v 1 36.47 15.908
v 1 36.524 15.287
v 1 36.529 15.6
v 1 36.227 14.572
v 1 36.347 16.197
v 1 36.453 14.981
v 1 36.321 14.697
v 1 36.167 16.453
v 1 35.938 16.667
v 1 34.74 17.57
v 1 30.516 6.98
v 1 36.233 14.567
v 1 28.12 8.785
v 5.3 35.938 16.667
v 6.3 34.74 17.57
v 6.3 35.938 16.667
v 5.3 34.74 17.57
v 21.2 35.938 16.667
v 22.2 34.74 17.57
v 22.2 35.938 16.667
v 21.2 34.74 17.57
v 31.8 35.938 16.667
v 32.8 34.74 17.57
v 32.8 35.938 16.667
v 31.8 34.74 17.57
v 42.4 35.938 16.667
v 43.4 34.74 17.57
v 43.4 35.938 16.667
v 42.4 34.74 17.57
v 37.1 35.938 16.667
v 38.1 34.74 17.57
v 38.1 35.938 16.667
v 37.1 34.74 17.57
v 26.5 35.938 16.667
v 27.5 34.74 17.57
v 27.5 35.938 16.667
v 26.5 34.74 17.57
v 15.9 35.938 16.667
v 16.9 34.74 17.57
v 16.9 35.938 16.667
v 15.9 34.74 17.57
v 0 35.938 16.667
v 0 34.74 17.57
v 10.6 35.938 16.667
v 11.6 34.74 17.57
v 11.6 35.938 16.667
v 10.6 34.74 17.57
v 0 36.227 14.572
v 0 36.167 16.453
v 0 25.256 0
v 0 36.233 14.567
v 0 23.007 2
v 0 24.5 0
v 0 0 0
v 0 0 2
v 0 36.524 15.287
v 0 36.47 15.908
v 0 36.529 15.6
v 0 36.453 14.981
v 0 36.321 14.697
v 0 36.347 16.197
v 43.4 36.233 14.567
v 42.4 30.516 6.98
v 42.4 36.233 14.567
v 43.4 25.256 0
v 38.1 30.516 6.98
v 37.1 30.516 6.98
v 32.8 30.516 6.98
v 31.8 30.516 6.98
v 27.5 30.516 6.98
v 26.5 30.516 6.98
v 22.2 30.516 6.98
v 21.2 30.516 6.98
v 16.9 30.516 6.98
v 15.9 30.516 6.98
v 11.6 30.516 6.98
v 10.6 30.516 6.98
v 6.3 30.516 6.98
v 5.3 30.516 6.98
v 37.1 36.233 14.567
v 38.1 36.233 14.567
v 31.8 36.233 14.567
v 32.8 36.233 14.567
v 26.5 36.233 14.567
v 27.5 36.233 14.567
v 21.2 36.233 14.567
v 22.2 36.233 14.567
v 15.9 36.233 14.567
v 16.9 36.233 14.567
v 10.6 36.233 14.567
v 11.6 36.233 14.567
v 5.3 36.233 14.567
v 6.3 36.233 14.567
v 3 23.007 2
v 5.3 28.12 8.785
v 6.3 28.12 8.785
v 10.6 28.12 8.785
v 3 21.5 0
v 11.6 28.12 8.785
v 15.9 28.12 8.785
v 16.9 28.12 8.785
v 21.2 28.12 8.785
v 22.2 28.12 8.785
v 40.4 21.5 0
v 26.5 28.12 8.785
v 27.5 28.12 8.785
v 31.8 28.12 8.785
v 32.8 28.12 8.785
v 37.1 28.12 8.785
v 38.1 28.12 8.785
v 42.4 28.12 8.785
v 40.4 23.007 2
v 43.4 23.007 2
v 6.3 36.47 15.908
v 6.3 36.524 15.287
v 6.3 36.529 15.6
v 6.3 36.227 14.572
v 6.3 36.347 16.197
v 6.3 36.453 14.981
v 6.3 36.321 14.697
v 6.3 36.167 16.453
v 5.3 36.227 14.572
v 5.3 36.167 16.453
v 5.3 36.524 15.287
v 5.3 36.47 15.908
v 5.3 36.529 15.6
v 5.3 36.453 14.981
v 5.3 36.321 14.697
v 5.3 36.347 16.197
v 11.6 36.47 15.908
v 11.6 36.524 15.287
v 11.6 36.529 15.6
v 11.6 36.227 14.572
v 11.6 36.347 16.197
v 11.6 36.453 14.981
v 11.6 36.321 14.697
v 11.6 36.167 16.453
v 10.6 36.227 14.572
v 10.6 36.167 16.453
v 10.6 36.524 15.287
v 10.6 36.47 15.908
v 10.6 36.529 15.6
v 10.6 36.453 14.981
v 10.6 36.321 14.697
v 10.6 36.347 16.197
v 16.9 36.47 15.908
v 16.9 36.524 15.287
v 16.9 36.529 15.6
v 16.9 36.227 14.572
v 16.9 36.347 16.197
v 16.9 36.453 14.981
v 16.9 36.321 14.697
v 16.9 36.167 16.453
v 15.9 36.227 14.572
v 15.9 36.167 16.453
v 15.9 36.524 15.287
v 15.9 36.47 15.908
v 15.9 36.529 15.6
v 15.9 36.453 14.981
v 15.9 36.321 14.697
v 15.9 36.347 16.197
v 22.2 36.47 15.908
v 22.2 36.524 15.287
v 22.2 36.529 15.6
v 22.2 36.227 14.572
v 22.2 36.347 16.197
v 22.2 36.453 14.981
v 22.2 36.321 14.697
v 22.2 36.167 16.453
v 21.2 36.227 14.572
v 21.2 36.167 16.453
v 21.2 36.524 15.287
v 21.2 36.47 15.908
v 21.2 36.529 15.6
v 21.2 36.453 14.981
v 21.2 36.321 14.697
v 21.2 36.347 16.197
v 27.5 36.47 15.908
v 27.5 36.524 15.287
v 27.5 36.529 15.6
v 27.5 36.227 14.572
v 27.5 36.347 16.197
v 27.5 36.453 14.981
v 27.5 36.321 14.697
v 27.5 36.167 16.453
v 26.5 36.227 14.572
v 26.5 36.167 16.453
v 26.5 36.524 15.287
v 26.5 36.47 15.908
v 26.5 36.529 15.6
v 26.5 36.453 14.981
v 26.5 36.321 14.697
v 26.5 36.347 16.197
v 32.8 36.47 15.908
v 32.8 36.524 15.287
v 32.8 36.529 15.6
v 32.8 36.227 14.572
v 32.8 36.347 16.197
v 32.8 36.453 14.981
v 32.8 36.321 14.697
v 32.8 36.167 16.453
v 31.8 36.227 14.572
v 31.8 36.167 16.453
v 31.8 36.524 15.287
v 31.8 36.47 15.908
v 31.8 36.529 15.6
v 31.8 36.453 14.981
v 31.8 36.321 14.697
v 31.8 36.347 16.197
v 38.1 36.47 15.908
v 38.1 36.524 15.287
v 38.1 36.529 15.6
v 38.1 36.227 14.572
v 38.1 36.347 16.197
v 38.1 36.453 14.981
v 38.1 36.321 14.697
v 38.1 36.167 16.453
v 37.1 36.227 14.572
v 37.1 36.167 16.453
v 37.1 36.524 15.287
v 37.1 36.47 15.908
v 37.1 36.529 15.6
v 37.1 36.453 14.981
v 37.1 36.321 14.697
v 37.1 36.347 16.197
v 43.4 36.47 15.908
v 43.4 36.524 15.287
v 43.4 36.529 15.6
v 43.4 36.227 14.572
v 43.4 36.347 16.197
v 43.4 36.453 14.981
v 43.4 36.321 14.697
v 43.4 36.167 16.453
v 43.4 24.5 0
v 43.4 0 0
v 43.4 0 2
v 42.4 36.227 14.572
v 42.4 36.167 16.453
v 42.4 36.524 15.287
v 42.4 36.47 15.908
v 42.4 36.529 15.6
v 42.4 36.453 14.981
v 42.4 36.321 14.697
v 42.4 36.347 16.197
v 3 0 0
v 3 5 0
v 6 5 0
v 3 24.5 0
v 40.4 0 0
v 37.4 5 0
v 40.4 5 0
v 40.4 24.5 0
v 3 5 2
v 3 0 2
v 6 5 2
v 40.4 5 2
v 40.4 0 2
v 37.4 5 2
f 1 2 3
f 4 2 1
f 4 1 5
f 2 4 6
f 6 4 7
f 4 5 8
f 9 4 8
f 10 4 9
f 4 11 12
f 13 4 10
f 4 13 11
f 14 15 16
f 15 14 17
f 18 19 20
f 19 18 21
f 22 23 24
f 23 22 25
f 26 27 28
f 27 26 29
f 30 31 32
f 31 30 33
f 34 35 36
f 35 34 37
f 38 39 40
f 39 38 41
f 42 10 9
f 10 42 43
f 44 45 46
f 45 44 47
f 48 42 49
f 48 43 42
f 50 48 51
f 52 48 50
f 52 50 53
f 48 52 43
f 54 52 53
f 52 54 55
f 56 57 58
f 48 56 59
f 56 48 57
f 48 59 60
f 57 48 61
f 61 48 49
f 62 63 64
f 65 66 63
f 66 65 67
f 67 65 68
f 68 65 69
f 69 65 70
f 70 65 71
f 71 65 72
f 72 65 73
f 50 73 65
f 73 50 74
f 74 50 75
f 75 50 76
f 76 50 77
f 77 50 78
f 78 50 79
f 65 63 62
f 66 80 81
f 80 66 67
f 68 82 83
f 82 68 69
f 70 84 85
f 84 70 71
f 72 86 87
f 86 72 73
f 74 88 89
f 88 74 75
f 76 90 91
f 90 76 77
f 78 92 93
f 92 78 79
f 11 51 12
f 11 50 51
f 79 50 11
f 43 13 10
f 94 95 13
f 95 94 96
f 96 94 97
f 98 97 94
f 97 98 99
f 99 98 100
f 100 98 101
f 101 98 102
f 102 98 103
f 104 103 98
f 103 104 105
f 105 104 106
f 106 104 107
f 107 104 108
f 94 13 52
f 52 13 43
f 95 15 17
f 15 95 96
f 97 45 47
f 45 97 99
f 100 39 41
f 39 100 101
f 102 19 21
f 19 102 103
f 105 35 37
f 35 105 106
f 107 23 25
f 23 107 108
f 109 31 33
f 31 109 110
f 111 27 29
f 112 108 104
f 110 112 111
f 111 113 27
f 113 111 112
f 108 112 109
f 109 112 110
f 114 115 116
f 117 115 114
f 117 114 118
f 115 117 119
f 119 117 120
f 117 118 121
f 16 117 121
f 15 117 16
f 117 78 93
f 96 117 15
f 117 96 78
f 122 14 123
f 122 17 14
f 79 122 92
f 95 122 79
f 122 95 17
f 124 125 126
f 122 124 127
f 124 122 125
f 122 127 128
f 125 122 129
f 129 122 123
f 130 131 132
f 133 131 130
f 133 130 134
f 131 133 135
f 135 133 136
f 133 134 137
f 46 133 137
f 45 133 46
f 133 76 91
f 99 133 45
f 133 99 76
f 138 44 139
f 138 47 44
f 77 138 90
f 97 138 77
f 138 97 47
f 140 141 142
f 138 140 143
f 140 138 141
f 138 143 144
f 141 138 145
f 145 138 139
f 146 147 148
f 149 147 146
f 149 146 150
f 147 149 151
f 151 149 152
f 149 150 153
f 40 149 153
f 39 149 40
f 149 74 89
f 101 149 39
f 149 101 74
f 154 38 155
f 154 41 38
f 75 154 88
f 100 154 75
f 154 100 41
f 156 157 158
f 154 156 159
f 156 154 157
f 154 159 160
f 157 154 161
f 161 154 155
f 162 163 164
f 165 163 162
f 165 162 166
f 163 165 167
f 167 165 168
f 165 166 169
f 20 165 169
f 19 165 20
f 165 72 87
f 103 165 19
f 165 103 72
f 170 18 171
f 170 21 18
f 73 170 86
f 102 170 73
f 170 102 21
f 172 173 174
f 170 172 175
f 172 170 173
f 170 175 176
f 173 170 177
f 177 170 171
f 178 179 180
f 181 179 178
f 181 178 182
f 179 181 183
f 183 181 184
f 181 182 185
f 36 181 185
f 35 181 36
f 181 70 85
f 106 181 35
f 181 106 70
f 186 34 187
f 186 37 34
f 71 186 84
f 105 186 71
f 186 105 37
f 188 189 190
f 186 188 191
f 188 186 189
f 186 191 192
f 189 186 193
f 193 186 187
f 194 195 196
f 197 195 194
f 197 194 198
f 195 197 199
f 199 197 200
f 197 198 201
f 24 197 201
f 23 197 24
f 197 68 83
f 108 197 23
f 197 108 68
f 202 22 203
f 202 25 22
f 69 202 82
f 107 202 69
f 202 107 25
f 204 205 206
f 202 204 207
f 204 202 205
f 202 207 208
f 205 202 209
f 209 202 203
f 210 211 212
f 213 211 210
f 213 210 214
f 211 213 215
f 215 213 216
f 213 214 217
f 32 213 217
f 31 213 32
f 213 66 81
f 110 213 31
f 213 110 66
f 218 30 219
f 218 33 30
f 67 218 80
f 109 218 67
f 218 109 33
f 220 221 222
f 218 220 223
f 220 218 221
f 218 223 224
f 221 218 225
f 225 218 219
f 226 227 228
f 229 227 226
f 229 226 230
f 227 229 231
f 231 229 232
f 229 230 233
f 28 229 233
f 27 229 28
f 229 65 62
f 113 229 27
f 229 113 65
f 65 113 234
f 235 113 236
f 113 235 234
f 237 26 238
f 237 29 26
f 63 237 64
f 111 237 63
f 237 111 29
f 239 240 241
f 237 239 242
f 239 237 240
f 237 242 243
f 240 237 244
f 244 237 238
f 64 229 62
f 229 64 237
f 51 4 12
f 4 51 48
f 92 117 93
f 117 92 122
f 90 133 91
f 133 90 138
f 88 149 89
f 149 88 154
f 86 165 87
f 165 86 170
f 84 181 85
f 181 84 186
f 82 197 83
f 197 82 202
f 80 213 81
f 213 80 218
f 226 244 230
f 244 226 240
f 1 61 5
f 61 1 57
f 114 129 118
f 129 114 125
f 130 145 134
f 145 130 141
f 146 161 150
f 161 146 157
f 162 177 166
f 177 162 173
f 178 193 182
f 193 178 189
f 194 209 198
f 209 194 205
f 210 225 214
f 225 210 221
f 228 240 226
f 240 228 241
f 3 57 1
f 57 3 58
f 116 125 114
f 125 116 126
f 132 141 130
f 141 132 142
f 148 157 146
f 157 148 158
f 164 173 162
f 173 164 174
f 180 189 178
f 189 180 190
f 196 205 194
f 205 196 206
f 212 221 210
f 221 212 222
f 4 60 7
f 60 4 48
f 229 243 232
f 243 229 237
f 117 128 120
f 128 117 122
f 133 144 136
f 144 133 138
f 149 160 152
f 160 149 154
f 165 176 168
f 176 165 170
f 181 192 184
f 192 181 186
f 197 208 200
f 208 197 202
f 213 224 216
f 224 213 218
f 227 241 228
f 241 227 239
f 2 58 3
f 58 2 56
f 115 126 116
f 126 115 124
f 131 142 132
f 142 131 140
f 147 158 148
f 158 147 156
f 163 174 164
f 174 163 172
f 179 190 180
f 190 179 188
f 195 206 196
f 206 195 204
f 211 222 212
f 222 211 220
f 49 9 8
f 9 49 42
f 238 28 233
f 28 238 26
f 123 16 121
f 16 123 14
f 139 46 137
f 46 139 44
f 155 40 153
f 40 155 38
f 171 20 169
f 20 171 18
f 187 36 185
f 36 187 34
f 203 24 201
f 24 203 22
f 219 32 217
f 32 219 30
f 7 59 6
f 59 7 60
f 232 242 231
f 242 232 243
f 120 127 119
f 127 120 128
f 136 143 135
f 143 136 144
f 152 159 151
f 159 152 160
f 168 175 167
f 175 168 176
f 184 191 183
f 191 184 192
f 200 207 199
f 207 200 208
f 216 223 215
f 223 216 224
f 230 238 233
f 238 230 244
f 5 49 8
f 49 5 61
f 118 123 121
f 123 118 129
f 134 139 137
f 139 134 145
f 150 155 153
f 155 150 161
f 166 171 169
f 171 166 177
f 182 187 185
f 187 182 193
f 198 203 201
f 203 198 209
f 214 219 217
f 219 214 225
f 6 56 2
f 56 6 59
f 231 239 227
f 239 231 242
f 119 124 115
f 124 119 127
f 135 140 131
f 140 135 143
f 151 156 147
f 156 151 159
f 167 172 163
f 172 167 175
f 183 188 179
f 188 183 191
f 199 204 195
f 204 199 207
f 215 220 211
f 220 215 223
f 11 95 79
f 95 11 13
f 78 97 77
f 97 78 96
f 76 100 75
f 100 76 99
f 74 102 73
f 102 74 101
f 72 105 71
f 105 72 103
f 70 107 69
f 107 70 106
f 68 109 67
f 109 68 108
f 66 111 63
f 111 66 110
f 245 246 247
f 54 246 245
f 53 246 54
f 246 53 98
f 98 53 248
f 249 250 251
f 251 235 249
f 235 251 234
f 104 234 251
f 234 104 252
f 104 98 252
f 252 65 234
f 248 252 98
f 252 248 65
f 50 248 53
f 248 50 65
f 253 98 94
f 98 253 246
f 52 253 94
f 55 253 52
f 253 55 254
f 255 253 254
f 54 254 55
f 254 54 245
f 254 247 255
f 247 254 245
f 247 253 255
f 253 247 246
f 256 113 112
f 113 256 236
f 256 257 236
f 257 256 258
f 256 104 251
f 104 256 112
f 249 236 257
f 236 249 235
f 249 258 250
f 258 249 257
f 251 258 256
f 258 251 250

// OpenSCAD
//width of haircutter
w = 37.4;

//holder height
hh = 2;
//holder width
hw = 3;



l = 24.5;

//holder pin length
hpl = 1.5;
//holder pin depth
hpd = 3;

phi = 37;

cube([hw,l,hh]); 



translate([hw,0,0]) {
linear_extrude(hh) polygon([[0,0],[0,5],[hpd,5]]);
//translate([0,5+hpl,0]) cube([hpd,28.5,hh]);
}

translate([w+hw,0,0]) cube([hw,l,hh]);
translate([w+hw,0,0]){ 
linear_extrude(hh) polygon([[0,0],[0,5],[-hpd,5]]);
//translate([-hpd,5+hpl,0]) cube([hpd,28.5,hh]);
}

//width of hair glider
ww = 1;
//number of hair glider
num = 8;
dist = (w+2*hw-ww) / num;


h = 22;

difference() {
translate([0,l-hw,0]) rotate([-phi,0,0]) {
    translate([0,0,0])    cube([w+2*hw,hw,h*0.5]);

    difference() {
        for(i = [0:num]) {
        translate([i*dist,0,0])cube([ww,hw,h]);
        }
        translate([0,hw/2,h-hw/2 ]) {
            difference() {
                translate([0,0,0])cube([w+2*hw,hw/2,hw/2]);
                rotate([0,90,0]) cylinder(w+2*hw,hw/2,hw/2,$fn=30);
            }
                }
    }

}
translate([-500,-500,-200]) cube([1000,1000,200]);
}
